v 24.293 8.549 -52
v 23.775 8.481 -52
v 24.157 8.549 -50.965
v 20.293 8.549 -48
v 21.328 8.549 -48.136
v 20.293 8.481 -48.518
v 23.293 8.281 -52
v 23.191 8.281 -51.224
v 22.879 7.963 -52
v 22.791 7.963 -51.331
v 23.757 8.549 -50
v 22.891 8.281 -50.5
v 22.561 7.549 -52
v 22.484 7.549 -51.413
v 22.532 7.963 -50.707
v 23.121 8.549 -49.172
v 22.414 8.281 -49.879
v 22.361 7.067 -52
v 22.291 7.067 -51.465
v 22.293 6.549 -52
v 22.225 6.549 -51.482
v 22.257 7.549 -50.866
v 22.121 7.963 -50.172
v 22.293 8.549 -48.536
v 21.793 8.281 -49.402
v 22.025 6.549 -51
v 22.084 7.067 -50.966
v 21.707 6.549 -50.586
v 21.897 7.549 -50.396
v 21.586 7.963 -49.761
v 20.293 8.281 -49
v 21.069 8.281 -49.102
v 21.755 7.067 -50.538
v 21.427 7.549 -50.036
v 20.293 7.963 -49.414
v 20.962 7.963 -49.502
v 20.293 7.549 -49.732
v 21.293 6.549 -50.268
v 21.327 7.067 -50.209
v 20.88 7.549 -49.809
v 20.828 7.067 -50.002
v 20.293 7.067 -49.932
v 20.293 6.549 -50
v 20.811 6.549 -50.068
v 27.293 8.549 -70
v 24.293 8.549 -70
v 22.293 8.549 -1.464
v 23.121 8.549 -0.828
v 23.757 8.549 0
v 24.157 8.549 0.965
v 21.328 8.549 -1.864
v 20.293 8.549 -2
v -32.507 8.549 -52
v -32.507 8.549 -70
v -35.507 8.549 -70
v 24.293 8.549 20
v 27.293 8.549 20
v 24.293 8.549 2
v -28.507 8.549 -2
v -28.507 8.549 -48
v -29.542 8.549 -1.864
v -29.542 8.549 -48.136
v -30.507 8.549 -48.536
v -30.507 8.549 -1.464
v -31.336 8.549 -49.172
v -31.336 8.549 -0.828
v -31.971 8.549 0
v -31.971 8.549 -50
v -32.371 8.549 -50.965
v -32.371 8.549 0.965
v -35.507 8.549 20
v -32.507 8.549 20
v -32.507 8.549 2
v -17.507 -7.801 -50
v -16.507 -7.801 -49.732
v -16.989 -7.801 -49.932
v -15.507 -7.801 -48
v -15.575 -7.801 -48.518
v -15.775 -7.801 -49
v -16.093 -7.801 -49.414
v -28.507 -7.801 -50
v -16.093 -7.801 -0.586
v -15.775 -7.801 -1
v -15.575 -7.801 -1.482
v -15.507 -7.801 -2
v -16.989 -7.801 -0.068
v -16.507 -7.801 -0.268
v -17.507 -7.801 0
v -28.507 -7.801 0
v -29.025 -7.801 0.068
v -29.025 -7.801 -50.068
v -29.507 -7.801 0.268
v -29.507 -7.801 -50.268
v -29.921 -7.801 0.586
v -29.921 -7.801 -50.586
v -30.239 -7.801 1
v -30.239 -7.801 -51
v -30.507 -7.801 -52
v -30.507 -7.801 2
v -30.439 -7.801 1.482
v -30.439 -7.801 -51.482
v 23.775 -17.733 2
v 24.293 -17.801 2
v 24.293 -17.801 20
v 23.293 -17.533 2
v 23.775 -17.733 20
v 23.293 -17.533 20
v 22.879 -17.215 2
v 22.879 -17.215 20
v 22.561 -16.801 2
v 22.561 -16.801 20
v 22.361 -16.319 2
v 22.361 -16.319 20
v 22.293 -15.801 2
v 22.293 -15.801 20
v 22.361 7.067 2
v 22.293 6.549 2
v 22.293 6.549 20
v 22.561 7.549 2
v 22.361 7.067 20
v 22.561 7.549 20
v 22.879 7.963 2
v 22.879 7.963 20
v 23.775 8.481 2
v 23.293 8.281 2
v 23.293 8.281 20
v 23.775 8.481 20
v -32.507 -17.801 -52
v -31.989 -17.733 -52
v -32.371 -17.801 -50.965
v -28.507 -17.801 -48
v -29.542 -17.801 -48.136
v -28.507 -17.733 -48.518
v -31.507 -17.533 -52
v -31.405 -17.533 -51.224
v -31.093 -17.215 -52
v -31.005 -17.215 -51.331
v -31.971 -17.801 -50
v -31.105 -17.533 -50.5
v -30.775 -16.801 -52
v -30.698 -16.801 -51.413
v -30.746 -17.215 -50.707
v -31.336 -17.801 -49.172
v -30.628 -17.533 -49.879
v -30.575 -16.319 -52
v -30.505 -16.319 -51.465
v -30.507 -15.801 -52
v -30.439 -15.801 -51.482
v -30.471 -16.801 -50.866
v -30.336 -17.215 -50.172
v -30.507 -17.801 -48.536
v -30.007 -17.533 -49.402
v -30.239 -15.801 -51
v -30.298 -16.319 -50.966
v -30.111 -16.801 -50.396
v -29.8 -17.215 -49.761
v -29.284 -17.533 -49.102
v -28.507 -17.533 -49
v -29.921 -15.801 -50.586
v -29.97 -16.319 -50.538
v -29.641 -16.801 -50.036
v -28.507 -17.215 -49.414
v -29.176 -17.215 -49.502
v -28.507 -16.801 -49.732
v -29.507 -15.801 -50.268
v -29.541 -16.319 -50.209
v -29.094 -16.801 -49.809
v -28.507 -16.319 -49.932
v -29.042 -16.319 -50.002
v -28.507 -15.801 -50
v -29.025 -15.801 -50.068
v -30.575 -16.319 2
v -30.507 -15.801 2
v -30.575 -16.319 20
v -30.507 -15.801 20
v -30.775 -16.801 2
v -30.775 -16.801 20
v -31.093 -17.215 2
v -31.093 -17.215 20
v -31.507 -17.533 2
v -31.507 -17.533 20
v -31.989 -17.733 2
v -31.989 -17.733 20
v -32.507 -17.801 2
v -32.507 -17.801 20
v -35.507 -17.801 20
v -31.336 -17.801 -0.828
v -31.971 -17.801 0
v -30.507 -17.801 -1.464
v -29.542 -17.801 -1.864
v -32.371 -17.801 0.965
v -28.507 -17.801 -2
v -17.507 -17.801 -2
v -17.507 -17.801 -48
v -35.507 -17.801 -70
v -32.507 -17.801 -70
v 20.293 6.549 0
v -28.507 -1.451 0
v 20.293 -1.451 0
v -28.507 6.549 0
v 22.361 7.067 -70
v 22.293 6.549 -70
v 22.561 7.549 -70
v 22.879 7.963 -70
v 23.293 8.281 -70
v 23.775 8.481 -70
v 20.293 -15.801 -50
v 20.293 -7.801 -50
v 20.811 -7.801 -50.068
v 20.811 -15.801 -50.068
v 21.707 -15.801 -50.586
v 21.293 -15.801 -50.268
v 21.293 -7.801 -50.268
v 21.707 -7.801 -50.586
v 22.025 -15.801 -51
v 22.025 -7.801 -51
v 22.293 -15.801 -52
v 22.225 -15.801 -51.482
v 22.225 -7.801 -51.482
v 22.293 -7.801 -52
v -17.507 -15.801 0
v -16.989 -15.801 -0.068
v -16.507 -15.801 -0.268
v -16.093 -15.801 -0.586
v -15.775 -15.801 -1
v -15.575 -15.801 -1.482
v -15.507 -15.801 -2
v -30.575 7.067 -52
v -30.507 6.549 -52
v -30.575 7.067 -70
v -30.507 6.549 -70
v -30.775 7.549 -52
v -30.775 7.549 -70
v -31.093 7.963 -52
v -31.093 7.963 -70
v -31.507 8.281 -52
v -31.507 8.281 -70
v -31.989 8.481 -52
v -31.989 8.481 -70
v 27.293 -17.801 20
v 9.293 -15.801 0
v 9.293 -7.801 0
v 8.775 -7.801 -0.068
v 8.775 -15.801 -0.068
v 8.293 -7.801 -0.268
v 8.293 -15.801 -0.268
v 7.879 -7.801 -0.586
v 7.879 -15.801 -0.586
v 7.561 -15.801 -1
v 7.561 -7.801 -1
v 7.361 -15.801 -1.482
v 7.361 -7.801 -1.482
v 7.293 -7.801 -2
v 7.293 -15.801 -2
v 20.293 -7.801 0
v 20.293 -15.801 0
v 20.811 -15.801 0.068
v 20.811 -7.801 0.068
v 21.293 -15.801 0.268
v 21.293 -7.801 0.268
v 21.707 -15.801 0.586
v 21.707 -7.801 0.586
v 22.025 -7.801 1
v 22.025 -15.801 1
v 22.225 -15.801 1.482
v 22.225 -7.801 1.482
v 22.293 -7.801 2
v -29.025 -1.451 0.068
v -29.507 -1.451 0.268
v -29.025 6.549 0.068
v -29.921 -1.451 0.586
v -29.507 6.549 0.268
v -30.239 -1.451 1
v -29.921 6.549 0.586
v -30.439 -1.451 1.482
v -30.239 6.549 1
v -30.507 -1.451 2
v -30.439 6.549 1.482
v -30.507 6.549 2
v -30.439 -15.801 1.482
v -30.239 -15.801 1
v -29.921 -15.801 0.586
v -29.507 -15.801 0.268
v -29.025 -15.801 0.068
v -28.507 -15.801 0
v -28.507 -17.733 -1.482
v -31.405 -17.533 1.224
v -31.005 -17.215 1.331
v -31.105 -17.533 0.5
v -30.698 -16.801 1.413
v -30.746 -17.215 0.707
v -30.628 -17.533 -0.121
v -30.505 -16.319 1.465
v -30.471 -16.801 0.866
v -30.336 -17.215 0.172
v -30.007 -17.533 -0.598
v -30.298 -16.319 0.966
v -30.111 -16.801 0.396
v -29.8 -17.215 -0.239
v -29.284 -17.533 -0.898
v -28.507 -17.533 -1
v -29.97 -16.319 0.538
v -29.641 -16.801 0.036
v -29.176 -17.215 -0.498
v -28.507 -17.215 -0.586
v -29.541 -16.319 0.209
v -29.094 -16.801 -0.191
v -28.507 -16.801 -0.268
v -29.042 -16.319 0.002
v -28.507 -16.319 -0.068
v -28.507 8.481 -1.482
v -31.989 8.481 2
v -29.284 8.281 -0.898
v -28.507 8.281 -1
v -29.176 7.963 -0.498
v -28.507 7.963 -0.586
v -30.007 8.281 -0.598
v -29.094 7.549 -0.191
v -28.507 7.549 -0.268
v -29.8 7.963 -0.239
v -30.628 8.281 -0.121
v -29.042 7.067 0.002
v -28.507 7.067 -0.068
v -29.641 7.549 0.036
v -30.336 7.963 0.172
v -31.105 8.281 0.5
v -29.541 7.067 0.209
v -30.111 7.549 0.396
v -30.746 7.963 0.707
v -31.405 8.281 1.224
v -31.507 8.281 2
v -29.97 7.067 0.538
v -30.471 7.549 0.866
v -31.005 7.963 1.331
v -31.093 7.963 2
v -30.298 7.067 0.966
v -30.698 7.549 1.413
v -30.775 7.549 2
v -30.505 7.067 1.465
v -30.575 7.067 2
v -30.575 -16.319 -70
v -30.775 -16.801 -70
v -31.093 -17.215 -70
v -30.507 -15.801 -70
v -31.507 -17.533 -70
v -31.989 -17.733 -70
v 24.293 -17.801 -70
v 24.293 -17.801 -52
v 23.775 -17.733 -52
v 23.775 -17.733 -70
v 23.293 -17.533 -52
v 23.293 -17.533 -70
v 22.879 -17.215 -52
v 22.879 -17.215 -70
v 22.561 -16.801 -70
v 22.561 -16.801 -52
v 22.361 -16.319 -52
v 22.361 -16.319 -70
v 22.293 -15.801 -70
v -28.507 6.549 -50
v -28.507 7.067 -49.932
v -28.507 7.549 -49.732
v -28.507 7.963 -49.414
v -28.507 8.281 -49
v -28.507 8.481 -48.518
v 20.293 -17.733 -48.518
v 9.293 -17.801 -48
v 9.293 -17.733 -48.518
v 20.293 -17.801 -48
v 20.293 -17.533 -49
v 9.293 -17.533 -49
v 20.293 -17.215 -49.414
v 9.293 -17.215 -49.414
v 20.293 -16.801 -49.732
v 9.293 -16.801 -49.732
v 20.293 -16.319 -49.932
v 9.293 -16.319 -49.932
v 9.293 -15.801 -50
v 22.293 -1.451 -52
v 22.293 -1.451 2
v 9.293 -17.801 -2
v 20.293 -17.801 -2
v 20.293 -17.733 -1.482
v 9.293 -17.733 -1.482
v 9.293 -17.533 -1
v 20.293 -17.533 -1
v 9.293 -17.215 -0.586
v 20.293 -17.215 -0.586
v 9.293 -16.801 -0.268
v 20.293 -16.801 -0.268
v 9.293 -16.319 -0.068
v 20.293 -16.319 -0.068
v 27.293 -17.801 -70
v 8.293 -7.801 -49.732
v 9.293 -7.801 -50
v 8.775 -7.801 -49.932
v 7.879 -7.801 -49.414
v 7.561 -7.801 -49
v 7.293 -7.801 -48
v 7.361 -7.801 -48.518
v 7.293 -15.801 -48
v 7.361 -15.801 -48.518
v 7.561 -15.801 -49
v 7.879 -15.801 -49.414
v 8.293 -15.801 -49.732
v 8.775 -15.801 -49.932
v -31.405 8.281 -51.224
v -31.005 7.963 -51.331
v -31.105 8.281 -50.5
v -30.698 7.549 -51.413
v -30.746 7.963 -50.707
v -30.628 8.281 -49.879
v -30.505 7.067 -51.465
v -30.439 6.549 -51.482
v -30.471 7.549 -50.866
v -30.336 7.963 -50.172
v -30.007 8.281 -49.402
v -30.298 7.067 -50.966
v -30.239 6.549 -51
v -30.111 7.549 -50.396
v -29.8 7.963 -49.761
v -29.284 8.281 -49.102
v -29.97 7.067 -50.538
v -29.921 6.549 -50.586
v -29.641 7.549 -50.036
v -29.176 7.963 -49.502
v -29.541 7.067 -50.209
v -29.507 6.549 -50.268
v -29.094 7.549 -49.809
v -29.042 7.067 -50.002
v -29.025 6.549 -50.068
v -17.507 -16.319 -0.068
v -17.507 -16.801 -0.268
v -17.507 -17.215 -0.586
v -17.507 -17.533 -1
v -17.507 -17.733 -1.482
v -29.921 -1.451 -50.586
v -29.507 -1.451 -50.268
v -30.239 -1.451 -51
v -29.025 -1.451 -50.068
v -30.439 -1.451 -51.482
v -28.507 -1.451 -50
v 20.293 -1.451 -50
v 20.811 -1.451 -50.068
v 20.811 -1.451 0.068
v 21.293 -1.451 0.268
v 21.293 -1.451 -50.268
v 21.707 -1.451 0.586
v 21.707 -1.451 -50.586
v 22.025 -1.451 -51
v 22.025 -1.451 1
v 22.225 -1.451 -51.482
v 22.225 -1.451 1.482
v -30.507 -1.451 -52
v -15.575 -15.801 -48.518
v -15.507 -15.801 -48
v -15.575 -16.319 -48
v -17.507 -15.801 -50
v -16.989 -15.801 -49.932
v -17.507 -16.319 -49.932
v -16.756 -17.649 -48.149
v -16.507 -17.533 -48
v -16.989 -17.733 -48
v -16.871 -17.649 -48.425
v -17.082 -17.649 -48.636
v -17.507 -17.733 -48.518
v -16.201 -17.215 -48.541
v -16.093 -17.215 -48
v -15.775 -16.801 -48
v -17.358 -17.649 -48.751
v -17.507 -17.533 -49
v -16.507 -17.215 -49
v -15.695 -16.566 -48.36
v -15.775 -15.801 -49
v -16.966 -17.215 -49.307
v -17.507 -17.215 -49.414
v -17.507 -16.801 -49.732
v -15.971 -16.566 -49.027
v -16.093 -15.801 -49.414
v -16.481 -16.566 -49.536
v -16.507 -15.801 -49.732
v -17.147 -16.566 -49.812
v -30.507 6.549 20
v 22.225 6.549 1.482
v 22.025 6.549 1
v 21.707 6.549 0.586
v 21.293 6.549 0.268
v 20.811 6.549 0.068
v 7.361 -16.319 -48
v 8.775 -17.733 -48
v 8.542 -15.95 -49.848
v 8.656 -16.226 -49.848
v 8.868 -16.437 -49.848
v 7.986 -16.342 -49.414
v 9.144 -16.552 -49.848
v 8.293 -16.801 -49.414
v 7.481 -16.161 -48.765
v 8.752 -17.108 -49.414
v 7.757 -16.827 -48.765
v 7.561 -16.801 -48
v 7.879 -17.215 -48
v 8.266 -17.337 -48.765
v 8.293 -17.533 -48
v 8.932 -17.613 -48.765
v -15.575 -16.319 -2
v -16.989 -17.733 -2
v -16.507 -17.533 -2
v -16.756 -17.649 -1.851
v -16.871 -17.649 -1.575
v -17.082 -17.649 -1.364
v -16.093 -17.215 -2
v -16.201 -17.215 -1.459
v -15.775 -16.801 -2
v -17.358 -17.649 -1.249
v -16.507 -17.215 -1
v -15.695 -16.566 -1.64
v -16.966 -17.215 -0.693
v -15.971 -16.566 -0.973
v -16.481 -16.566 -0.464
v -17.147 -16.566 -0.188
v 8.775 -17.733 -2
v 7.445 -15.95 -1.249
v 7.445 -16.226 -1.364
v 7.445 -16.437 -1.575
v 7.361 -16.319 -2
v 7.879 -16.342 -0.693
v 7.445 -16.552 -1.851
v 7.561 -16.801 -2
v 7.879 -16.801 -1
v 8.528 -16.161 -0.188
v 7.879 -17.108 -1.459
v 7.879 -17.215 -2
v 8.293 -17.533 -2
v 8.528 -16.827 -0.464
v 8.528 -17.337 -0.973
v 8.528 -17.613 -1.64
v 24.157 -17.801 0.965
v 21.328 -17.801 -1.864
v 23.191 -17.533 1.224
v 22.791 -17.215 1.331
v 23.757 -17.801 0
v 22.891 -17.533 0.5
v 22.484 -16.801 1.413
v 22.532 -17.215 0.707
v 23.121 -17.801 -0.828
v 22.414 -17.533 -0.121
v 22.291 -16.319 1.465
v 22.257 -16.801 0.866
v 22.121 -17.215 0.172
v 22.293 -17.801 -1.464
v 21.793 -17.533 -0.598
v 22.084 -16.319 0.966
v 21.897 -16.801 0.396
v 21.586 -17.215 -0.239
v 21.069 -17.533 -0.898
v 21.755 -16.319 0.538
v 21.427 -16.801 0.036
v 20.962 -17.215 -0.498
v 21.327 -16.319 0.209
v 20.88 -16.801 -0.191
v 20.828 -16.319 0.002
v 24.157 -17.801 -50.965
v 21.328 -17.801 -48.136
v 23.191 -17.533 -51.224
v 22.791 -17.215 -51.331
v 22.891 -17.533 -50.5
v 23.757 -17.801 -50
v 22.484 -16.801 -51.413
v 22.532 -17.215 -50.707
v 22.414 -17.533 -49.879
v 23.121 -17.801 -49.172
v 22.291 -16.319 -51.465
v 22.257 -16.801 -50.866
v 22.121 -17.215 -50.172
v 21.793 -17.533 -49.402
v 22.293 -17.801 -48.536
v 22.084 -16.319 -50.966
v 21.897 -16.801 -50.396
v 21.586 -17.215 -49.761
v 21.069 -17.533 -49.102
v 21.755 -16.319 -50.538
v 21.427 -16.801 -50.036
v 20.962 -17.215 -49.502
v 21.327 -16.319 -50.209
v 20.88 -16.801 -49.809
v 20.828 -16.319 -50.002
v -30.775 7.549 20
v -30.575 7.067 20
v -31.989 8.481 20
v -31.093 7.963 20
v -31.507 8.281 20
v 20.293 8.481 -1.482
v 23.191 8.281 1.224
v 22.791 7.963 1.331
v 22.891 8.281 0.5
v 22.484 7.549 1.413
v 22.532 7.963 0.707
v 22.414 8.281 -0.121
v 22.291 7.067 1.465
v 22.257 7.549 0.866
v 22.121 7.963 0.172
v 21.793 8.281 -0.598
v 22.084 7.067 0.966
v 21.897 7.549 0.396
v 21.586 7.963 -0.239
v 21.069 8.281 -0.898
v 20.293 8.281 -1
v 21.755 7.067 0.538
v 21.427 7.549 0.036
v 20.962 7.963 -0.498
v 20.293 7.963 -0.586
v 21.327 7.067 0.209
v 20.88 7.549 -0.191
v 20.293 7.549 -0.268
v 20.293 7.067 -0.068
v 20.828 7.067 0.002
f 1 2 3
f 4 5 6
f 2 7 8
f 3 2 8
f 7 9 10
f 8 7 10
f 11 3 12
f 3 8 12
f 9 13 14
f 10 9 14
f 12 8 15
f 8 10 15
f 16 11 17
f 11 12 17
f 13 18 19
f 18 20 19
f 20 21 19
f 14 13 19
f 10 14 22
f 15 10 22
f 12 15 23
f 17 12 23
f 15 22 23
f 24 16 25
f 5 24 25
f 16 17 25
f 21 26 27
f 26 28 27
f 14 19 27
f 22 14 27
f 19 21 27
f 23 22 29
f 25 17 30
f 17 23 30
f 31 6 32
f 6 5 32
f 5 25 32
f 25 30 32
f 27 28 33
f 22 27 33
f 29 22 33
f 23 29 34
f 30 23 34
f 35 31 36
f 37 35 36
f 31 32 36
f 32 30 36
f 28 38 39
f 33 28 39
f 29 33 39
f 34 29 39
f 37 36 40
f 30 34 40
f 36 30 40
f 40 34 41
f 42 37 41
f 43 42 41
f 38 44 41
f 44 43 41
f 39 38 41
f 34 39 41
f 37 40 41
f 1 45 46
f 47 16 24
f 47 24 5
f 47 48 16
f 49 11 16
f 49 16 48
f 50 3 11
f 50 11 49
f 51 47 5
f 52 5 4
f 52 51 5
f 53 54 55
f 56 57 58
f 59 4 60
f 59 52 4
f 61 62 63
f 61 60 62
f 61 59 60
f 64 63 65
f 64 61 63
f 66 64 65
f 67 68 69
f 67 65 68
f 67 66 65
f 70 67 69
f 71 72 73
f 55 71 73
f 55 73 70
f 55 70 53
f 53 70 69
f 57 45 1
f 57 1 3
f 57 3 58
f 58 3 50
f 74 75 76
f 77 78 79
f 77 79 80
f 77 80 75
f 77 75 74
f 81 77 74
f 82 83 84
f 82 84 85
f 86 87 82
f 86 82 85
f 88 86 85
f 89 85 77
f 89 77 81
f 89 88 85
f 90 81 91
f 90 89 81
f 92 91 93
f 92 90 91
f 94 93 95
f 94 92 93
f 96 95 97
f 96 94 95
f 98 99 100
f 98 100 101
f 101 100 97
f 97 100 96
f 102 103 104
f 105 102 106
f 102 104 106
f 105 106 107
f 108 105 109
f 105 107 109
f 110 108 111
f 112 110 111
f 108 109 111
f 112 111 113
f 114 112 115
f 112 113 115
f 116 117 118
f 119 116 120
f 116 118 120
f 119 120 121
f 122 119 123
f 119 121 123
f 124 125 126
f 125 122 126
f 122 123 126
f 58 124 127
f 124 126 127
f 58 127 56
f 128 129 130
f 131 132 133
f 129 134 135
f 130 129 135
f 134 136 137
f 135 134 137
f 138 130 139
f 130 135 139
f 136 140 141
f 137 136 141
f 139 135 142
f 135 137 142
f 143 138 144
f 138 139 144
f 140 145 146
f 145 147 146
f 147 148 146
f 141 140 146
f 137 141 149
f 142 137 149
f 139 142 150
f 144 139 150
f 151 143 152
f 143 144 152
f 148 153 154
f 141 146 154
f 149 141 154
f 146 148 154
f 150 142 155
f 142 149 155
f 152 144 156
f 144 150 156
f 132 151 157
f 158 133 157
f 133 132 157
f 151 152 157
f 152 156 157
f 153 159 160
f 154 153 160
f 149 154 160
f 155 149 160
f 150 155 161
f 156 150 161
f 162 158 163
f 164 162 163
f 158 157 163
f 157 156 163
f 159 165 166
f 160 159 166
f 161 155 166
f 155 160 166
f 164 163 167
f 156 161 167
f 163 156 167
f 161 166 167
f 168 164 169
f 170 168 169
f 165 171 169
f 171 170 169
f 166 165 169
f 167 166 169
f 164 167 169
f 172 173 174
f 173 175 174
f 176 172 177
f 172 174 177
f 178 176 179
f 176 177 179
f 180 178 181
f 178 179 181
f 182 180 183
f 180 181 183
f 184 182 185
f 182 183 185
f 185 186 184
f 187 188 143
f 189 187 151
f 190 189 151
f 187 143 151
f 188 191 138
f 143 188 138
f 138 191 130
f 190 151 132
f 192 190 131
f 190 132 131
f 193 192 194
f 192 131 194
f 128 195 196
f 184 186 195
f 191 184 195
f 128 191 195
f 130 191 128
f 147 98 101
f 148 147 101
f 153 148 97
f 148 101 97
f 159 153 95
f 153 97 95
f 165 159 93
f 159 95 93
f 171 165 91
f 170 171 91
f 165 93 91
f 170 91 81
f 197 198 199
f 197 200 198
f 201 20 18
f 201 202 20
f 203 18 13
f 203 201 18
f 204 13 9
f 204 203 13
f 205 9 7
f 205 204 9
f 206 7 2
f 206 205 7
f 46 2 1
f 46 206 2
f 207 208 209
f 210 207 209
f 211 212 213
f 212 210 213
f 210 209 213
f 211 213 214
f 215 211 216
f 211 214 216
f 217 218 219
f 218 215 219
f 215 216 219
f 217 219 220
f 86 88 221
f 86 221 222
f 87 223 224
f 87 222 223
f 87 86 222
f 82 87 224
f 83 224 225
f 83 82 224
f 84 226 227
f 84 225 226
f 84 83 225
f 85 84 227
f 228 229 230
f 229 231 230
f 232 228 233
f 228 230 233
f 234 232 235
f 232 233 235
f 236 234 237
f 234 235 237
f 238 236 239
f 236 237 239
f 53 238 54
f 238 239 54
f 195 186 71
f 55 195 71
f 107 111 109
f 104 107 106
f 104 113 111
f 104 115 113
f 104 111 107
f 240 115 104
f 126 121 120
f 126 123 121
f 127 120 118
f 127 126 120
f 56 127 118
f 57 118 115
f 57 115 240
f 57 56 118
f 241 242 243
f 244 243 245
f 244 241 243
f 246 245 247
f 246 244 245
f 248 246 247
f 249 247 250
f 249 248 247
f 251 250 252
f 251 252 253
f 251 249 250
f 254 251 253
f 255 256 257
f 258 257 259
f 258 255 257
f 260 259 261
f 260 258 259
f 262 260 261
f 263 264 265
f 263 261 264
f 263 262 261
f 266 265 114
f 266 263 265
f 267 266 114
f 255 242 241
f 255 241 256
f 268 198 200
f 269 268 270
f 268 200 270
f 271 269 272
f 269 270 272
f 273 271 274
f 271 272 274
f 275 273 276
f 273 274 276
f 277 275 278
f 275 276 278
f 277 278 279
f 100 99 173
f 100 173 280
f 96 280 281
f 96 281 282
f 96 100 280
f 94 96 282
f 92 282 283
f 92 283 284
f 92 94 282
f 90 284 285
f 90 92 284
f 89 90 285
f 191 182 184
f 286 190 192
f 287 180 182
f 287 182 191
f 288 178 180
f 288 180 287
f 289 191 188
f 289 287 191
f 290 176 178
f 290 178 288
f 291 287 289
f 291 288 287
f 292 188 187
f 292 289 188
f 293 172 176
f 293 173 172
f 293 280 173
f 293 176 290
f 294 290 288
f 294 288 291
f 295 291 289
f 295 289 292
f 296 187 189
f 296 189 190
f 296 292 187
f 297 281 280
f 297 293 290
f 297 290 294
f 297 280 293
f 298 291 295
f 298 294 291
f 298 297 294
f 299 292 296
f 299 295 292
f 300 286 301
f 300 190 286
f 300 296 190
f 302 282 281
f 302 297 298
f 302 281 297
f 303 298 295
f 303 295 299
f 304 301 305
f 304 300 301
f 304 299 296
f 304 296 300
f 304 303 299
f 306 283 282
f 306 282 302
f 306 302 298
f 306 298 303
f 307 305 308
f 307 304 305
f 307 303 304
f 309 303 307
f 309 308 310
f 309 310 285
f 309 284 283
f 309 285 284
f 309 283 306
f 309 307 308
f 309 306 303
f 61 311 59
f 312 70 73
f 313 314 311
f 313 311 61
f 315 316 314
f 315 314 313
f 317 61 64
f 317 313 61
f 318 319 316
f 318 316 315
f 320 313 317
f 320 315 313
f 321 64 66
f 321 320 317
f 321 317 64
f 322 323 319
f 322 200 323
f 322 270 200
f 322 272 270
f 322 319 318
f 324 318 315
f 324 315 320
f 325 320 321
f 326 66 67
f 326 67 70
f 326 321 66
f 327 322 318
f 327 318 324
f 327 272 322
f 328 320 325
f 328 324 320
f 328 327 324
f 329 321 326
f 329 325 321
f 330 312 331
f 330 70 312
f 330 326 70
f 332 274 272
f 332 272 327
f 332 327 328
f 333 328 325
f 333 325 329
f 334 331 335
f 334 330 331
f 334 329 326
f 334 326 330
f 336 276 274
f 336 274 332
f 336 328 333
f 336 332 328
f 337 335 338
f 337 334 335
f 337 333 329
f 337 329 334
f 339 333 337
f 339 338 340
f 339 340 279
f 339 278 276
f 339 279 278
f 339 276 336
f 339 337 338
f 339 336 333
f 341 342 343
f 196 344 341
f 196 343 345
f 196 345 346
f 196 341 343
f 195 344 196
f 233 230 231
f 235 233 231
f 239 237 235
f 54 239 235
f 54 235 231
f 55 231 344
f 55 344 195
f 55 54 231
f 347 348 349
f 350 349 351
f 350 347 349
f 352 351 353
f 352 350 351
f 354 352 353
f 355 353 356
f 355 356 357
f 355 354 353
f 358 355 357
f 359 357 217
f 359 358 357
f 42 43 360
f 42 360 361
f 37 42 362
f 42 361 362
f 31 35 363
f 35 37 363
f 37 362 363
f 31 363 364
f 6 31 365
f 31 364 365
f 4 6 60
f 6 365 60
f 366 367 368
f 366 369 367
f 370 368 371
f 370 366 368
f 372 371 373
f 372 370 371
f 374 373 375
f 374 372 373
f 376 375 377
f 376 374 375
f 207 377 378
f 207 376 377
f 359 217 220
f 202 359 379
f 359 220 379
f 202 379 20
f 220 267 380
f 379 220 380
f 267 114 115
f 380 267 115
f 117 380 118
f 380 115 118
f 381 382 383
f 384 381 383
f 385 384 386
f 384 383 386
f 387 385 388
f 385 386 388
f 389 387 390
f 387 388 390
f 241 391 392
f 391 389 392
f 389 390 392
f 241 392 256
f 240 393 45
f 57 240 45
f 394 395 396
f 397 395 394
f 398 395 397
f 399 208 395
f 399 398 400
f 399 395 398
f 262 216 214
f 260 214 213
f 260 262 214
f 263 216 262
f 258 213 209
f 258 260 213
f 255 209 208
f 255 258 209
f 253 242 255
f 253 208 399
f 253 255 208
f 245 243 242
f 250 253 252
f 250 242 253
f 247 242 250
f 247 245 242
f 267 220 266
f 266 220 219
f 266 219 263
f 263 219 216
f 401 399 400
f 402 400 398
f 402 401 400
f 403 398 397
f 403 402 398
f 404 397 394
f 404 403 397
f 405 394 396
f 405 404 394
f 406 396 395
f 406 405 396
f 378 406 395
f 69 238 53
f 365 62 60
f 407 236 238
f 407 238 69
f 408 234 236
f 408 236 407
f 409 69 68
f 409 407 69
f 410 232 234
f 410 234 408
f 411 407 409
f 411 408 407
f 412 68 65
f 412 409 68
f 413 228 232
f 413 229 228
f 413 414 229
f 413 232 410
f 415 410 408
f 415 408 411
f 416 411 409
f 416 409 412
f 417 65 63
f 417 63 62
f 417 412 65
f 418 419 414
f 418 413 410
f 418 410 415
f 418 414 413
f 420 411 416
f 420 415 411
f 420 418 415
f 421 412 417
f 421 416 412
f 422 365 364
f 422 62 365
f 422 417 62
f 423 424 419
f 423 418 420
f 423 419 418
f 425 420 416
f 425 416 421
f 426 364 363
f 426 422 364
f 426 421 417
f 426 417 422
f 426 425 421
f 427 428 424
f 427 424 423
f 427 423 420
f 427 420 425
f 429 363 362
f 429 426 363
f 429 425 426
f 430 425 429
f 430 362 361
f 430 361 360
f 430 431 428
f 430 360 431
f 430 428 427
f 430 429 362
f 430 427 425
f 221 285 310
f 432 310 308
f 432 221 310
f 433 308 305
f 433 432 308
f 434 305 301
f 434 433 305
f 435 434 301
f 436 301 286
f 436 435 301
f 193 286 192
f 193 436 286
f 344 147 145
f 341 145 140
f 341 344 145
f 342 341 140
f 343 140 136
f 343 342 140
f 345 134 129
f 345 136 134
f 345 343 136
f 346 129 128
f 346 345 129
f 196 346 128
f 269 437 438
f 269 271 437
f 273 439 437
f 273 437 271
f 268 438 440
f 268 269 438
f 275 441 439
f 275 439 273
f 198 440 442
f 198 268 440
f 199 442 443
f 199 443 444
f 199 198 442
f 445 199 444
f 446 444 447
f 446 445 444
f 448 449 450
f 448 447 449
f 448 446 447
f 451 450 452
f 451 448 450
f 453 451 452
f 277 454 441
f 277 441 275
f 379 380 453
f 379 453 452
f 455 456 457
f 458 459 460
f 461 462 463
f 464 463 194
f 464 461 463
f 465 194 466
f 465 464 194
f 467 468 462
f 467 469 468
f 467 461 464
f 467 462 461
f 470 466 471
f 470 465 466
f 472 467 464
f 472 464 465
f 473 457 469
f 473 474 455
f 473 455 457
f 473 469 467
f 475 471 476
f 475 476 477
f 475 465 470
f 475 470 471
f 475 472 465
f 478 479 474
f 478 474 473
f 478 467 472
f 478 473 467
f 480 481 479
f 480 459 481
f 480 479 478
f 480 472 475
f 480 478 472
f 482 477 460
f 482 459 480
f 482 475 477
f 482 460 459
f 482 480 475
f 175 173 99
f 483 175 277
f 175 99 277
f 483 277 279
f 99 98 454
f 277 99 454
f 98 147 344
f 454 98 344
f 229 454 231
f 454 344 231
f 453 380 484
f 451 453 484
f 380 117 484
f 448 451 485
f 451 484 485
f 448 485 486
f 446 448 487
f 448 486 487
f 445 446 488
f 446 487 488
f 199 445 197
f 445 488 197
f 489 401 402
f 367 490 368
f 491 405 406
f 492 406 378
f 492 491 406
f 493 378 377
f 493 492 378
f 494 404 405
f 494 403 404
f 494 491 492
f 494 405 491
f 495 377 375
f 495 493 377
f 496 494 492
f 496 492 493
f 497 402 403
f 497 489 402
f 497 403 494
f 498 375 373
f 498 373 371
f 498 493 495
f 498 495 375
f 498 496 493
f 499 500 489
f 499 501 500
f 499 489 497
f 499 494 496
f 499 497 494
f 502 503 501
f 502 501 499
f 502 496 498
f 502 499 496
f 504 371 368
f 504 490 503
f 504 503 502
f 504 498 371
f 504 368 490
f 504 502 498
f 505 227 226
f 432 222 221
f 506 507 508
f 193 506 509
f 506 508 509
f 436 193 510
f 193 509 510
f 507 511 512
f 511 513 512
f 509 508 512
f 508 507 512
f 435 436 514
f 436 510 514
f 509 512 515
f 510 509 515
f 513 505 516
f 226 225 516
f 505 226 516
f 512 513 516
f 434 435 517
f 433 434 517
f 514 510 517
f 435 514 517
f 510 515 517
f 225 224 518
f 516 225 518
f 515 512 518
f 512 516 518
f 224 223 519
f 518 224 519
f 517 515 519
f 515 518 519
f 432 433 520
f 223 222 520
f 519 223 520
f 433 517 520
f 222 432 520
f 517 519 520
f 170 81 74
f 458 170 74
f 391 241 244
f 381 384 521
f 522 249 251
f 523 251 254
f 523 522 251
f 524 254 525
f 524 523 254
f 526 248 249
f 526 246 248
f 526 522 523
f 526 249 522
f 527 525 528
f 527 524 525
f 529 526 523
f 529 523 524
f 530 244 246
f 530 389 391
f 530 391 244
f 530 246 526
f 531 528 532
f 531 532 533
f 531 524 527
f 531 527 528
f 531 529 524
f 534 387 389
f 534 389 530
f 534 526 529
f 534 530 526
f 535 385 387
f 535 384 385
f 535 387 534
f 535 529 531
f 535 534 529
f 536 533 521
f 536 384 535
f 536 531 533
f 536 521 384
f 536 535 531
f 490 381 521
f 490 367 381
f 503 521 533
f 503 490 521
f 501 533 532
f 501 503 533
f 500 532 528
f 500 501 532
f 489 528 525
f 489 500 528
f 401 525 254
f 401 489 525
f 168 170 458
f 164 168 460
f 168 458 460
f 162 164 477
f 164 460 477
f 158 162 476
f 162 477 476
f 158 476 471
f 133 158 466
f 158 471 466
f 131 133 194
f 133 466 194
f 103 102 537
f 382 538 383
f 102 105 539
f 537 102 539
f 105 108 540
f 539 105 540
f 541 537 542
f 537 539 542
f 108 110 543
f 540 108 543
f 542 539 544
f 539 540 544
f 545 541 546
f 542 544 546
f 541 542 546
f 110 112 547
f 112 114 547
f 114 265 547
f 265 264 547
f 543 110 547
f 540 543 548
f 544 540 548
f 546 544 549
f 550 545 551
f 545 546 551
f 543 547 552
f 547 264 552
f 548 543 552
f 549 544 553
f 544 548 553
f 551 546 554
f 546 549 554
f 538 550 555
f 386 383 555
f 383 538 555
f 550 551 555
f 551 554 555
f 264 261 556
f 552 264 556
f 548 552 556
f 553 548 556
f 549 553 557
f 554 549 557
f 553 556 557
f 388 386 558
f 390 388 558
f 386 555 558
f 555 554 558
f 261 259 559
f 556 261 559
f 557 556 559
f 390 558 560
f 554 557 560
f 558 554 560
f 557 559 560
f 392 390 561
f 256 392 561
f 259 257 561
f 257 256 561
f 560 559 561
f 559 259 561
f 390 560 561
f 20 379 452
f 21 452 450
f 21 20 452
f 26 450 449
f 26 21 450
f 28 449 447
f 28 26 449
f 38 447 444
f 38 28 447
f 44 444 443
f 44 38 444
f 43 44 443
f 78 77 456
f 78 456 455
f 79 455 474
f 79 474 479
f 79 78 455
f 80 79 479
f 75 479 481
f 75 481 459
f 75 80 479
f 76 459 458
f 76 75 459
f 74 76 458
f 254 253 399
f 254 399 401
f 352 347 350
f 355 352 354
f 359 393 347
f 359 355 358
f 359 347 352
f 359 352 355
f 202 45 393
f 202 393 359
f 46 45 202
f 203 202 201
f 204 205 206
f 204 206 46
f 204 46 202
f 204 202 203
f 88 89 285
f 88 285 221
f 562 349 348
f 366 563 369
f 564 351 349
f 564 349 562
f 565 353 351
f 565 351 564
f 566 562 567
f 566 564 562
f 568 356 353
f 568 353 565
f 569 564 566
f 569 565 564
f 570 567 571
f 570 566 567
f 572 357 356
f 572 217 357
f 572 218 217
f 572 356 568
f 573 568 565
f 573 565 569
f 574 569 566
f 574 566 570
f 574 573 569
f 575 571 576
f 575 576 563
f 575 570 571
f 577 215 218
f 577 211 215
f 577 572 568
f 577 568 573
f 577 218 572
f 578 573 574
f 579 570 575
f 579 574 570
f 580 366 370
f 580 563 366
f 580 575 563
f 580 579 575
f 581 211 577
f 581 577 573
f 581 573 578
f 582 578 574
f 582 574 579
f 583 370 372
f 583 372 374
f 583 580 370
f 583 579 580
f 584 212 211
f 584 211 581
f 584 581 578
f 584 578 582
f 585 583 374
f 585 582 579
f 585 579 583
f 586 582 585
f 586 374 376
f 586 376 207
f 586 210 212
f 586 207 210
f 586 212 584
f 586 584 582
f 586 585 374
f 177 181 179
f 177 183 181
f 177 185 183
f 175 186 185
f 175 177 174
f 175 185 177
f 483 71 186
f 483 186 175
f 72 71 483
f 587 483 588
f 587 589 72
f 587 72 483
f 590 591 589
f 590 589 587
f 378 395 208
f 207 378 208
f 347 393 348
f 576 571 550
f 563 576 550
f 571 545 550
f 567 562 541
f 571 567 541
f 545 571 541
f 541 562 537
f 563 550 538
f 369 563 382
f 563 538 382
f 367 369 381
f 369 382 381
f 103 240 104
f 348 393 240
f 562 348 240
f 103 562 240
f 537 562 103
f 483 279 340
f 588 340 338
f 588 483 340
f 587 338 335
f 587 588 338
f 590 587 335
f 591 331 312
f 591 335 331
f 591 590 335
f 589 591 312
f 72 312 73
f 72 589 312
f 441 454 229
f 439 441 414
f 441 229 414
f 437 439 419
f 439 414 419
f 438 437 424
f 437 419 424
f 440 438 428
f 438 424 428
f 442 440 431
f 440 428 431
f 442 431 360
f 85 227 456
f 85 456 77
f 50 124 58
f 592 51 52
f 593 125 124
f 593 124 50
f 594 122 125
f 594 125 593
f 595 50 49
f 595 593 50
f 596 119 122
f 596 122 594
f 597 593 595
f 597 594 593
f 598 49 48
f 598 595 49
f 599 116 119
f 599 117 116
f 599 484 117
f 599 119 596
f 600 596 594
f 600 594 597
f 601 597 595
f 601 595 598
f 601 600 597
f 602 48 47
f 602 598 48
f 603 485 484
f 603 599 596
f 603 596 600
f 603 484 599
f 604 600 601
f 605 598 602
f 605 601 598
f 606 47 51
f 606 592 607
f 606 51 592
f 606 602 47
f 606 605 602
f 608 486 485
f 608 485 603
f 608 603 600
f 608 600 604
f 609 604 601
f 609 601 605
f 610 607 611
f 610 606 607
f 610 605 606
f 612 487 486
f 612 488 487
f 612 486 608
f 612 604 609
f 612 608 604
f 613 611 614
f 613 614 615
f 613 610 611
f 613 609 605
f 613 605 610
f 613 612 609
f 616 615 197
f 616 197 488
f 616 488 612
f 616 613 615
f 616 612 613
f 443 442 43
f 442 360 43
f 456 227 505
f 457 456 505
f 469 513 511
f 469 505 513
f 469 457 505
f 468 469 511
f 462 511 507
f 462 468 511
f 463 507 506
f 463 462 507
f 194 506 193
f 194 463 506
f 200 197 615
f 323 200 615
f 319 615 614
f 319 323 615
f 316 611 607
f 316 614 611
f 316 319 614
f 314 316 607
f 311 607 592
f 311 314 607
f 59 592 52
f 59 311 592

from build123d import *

# Parameters (mm, degrees)
BOSS_EXTRUDE1_DEPTH = 50
SKETCH2_W           = 5
SKETCH2_H           = 26.35
BOSS_EXTRUDE2_DEPTH = 20
SKETCH4_W           = 5
SKETCH4_H           = 26.35
BOSS_EXTRUDE3_DEPTH = 20
FILLET2_R           = 2


with BuildPart() as part:
    # Sketch1 → Boss-Extrude1 (new body)
    with BuildSketch(Plane.XY):
        Polygon((27.292868212, 8.549060403), (-35.507131788, 8.549060403), (-35.507131788, -17.800939597), (-15.507131788, -17.800939597), (-15.507131788, -7.800939597), (-30.507131788, -7.800939597), (-30.507131788, -1.450939597), (22.292868212, -1.450939597), (22.292868212, -7.800939597), (7.292868212, -7.800939597), (7.292868212, -17.800939597), (27.292868212, -17.800939597), align=None)
    extrude(amount=-BOSS_EXTRUDE1_DEPTH)

    # Sketch2 → Boss-Extrude2 (add)
    with BuildSketch(Plane.XY):
        with Locations((-33.007131788, -4.625939597)):
            Rectangle(SKETCH2_W, SKETCH2_H)
        with Locations((24.792868212, -4.625939597)):
            Rectangle(SKETCH2_W, SKETCH2_H)
    extrude(amount=BOSS_EXTRUDE2_DEPTH)

    # Sketch4 → Boss-Extrude3 (add)
    with BuildSketch(Plane(origin=(0, 0, -50), x_dir=(-1, 0, 0), z_dir=(0, 0, -1))):
        with Locations((-24.792868212, -4.625939597)):
            Rectangle(SKETCH4_W, SKETCH4_H)
        with Locations((33.007131788, -4.625939597)):
            Rectangle(SKETCH4_W, SKETCH4_H)
    extrude(amount=BOSS_EXTRUDE3_DEPTH)

    # Fillet2
    fillet2_edges = [part.edges().sort_by_distance(p)[0] for p in [
        (-15.507131788, -12.800939597, -50),
        (14.792868212, -17.800939597, 0),
        (7.292868212, -12.800939597, 0),
        (-15.507131788, -12.800939597, 0),
        (7.292868212, -17.800939597, -25),
        (-15.507131788, -17.800939597, -25),
        (-23.007131788, -17.800939597, 0),
        (-30.507131788, -12.800939597, 0),
        (7.292868212, -12.800939597, -50),
        (-30.507131788, 8.549060403, 10),
        (-30.507131788, -17.800939597, 10),
        (-30.507131788, 3.549060403, 0),
        (14.792868212, -17.800939597, -50),
        (-4.107131788, 8.549060403, 0),
        (22.292868212, 3.549060403, 0),
        (22.292868212, -12.800939597, 0),
        (22.292868212, 8.549060403, 10),
        (22.292868212, -17.800939597, 10),
        (-4.107131788, 8.549060403, -50),
        (22.292868212, 3.549060403, -50),
        (22.292868212, -12.800939597, -50),
        (22.292868212, -17.800939597, -60),
        (22.292868212, 8.549060403, -60),
        (-23.007131788, -17.800939597, -50),
        (-30.507131788, 3.549060403, -50),
        (-30.507131788, -12.800939597, -50),
        (-30.507131788, 8.549060403, -60),
        (-30.507131788, -17.800939597, -60),
    ]]
    fillet(fillet2_edges, radius=FILLET2_R)


solid = part.part
